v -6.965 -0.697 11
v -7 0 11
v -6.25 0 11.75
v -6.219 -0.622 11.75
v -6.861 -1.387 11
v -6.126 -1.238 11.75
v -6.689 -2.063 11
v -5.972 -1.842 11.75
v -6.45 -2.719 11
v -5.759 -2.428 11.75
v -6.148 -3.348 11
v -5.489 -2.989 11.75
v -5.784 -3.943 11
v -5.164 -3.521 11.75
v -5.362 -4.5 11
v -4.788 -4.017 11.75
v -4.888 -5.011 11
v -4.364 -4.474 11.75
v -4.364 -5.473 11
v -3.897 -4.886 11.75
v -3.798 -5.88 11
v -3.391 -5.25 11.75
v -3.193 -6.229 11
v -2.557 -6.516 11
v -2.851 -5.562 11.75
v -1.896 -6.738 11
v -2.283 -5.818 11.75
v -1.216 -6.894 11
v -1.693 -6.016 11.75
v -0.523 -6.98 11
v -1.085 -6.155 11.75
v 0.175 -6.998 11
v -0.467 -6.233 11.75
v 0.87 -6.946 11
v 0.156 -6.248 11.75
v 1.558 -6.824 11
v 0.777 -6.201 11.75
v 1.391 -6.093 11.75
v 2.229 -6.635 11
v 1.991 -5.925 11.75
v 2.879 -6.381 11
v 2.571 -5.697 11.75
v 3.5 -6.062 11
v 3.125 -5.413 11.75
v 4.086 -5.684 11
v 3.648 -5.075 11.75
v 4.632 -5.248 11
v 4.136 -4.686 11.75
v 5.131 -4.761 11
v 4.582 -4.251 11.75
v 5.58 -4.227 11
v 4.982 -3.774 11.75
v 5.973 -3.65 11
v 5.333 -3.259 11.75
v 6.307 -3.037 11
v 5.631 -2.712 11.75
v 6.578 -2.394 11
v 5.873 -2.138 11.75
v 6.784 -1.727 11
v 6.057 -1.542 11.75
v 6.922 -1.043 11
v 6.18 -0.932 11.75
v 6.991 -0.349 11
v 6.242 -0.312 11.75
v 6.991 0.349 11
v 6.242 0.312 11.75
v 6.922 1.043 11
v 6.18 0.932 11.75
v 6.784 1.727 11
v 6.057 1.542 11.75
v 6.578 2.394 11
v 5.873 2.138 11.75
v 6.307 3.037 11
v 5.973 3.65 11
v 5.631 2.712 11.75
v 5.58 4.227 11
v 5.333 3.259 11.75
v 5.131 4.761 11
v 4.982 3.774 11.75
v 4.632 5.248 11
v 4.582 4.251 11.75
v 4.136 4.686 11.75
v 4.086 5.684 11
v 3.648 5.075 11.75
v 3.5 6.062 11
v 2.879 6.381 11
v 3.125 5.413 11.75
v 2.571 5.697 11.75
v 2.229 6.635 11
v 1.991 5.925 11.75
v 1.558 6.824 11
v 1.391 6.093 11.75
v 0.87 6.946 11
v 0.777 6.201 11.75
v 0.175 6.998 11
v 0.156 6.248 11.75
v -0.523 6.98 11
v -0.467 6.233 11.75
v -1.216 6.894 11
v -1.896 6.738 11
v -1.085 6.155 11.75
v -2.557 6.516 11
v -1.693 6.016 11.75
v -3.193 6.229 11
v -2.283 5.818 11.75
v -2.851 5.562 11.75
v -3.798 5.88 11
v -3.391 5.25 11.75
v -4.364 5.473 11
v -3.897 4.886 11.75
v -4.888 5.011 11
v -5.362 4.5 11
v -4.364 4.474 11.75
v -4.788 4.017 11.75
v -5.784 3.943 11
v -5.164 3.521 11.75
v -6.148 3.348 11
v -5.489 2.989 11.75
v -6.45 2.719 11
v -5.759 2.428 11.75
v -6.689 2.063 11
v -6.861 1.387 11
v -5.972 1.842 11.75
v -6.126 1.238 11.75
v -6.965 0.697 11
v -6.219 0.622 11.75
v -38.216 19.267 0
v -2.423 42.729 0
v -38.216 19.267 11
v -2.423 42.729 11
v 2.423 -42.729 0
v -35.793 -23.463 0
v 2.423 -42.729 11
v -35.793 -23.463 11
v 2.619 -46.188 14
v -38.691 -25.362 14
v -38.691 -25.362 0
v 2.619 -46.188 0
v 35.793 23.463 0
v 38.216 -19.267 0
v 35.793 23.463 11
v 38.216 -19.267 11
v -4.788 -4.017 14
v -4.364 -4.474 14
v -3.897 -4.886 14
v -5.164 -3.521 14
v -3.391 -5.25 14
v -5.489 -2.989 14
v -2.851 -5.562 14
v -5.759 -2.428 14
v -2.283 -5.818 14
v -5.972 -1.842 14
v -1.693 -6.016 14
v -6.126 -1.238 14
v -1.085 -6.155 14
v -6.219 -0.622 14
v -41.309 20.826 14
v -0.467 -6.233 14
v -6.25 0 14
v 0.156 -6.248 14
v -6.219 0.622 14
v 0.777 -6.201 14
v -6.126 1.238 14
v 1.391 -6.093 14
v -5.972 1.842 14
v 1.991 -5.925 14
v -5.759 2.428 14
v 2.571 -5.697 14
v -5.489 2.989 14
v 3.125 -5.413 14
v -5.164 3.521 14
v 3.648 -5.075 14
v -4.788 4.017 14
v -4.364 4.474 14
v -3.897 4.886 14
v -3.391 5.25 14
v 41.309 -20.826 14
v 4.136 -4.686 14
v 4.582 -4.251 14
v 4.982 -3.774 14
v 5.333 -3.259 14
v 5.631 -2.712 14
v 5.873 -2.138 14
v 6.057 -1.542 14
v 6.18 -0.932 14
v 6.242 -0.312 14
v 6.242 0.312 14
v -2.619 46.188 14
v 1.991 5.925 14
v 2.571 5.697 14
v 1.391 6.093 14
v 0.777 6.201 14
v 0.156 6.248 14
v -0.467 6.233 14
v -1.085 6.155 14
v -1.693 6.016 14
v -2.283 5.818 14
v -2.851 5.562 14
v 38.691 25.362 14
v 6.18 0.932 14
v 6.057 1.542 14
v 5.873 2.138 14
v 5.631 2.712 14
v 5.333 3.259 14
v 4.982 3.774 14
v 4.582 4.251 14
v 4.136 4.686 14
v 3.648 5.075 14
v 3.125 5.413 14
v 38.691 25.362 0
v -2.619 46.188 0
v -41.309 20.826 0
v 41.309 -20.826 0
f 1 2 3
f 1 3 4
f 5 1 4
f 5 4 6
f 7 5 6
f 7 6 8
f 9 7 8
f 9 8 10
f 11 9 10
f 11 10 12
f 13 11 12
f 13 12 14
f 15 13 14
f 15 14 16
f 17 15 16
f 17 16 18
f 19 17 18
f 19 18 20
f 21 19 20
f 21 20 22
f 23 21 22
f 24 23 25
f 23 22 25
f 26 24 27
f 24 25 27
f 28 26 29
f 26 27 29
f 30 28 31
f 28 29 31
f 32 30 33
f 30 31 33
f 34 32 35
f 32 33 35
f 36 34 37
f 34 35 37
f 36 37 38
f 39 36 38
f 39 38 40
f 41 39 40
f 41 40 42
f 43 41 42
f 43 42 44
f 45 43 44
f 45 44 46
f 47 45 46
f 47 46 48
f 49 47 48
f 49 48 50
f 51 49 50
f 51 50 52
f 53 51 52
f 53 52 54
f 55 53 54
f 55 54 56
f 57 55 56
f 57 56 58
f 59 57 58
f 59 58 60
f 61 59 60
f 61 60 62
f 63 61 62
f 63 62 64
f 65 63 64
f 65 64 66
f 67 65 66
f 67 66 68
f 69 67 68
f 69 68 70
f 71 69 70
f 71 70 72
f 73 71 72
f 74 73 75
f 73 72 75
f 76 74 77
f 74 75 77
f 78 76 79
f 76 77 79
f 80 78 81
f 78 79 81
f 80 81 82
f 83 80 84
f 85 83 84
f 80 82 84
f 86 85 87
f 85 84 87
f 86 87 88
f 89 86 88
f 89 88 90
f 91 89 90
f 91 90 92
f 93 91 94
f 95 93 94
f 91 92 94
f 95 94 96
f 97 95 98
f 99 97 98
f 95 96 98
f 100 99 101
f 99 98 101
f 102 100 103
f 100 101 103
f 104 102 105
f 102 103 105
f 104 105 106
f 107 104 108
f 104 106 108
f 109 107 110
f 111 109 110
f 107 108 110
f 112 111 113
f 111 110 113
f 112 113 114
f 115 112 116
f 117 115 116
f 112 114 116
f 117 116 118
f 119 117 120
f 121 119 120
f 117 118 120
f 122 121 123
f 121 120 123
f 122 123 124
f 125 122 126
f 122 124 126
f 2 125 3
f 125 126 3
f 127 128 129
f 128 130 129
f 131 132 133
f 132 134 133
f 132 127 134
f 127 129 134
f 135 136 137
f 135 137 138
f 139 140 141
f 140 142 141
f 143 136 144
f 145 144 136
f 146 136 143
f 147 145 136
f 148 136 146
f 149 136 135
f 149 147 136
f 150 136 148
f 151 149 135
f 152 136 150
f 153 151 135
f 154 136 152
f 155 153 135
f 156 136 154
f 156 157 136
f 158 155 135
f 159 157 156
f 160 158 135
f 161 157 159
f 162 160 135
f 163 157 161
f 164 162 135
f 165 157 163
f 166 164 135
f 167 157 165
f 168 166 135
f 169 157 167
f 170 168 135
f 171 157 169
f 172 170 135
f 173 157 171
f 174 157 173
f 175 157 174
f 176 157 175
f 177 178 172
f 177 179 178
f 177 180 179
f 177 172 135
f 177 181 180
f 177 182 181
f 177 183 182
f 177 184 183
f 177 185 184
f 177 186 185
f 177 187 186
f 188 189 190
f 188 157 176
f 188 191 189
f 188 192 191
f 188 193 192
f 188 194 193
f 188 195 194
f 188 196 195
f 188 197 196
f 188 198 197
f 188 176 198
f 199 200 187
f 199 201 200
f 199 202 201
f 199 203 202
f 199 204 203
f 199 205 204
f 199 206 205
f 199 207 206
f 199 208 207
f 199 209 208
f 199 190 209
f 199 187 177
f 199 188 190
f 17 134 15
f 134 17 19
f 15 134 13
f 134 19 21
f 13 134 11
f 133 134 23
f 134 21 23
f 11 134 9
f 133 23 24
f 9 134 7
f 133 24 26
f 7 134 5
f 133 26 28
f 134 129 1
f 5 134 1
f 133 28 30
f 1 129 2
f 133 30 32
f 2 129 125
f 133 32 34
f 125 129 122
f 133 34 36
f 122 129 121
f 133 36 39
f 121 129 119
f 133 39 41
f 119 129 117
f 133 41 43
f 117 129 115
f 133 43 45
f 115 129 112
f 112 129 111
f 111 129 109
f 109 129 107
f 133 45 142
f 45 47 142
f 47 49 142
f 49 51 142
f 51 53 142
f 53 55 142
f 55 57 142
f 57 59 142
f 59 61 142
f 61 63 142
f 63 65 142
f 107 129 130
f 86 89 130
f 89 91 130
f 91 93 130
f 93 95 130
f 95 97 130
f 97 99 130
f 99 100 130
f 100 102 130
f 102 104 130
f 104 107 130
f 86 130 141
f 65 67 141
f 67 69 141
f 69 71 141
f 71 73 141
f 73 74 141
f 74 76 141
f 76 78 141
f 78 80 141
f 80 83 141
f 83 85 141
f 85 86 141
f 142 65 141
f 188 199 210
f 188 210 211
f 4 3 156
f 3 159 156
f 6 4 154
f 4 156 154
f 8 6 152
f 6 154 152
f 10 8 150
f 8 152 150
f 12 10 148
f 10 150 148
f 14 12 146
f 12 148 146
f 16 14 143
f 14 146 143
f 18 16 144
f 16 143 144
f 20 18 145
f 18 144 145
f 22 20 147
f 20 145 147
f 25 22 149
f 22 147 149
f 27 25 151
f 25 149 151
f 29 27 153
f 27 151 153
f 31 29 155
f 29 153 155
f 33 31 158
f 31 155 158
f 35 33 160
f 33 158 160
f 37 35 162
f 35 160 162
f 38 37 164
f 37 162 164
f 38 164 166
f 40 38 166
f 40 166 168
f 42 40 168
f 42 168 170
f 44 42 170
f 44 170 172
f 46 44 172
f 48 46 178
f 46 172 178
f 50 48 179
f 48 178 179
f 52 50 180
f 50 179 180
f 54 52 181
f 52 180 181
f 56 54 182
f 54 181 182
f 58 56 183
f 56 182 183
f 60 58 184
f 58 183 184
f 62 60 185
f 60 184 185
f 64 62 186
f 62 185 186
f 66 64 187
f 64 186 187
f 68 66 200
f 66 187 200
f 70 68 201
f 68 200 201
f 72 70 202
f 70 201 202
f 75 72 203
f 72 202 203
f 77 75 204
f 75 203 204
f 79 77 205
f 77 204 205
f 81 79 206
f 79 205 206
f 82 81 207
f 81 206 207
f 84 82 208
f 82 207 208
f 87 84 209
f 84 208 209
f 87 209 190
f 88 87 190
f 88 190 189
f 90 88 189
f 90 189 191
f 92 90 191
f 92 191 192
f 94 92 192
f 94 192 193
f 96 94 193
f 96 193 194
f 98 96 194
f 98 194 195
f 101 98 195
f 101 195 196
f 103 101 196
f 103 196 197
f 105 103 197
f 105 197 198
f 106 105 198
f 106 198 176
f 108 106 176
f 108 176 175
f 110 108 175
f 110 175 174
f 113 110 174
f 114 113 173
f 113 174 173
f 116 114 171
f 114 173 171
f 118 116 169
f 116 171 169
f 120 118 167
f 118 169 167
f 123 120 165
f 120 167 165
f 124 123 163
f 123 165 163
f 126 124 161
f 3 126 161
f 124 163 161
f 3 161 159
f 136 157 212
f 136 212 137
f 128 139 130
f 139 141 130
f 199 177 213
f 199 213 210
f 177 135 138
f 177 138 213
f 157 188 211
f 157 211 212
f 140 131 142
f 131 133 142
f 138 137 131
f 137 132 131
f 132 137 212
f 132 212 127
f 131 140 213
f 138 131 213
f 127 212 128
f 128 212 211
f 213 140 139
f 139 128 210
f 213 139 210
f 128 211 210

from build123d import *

# Parameters (mm, degrees)
F4_T           = -3
F5_D           = 12.5
F5_DEPTH       = 5
F5_START       = 11
F5_CSINK_D     = 14
F5_CSINK_ANGLE = 90
F5_TIP         = 3.7553788689


with BuildPart() as f2:
    # F2: sweep along a path in F1
    with BuildLine(Plane.XZ) as f2_path:
        Line((0, 0), (0, 14))
    # F0 (on Top) → F2 (sweep)
    with BuildSketch(Plane.XY):
        Polygon((2.618910053, -46.1880215352), (41.3094550265, -20.8259681314), (38.6905449735, 25.3620534037), (-2.618910053, 46.1880215352), (-41.3094550265, 20.8259681314), (-38.6905449735, -25.3620534037), align=None)
    sweep(path=f2_path.line)

    # F4
    f4_openings = [f2.faces().sort_by_distance(p)[0] for p in [
        (0, 0, 0),
    ]]
    offset(amount=F4_T, openings=f4_openings)

    # F5
    # its depths count from where the whole tool has entered the part; down to there all is cleared
    with Locations(Plane(origin=(0, 0, 0), x_dir=(1, 0, 0), z_dir=(0, 0, -1))):
        with Locations((0, 0)):
            Hole(F5_CSINK_D / 2, depth=F5_START)
    with Locations(Plane(origin=(0, 0, 0), x_dir=(1, 0, 0), z_dir=(0, 0, -1)).offset(-F5_START)):
        with Locations((0, 0)):
            CounterSinkHole(F5_D / 2, F5_CSINK_D / 2, depth=F5_DEPTH, counter_sink_angle=F5_CSINK_ANGLE)
            with Locations((0, 0, -(F5_DEPTH + F5_TIP / 2))):  # 118° drill point
                Cone(0, F5_D / 2, F5_TIP, mode=Mode.SUBTRACT)


solid = f2.part
